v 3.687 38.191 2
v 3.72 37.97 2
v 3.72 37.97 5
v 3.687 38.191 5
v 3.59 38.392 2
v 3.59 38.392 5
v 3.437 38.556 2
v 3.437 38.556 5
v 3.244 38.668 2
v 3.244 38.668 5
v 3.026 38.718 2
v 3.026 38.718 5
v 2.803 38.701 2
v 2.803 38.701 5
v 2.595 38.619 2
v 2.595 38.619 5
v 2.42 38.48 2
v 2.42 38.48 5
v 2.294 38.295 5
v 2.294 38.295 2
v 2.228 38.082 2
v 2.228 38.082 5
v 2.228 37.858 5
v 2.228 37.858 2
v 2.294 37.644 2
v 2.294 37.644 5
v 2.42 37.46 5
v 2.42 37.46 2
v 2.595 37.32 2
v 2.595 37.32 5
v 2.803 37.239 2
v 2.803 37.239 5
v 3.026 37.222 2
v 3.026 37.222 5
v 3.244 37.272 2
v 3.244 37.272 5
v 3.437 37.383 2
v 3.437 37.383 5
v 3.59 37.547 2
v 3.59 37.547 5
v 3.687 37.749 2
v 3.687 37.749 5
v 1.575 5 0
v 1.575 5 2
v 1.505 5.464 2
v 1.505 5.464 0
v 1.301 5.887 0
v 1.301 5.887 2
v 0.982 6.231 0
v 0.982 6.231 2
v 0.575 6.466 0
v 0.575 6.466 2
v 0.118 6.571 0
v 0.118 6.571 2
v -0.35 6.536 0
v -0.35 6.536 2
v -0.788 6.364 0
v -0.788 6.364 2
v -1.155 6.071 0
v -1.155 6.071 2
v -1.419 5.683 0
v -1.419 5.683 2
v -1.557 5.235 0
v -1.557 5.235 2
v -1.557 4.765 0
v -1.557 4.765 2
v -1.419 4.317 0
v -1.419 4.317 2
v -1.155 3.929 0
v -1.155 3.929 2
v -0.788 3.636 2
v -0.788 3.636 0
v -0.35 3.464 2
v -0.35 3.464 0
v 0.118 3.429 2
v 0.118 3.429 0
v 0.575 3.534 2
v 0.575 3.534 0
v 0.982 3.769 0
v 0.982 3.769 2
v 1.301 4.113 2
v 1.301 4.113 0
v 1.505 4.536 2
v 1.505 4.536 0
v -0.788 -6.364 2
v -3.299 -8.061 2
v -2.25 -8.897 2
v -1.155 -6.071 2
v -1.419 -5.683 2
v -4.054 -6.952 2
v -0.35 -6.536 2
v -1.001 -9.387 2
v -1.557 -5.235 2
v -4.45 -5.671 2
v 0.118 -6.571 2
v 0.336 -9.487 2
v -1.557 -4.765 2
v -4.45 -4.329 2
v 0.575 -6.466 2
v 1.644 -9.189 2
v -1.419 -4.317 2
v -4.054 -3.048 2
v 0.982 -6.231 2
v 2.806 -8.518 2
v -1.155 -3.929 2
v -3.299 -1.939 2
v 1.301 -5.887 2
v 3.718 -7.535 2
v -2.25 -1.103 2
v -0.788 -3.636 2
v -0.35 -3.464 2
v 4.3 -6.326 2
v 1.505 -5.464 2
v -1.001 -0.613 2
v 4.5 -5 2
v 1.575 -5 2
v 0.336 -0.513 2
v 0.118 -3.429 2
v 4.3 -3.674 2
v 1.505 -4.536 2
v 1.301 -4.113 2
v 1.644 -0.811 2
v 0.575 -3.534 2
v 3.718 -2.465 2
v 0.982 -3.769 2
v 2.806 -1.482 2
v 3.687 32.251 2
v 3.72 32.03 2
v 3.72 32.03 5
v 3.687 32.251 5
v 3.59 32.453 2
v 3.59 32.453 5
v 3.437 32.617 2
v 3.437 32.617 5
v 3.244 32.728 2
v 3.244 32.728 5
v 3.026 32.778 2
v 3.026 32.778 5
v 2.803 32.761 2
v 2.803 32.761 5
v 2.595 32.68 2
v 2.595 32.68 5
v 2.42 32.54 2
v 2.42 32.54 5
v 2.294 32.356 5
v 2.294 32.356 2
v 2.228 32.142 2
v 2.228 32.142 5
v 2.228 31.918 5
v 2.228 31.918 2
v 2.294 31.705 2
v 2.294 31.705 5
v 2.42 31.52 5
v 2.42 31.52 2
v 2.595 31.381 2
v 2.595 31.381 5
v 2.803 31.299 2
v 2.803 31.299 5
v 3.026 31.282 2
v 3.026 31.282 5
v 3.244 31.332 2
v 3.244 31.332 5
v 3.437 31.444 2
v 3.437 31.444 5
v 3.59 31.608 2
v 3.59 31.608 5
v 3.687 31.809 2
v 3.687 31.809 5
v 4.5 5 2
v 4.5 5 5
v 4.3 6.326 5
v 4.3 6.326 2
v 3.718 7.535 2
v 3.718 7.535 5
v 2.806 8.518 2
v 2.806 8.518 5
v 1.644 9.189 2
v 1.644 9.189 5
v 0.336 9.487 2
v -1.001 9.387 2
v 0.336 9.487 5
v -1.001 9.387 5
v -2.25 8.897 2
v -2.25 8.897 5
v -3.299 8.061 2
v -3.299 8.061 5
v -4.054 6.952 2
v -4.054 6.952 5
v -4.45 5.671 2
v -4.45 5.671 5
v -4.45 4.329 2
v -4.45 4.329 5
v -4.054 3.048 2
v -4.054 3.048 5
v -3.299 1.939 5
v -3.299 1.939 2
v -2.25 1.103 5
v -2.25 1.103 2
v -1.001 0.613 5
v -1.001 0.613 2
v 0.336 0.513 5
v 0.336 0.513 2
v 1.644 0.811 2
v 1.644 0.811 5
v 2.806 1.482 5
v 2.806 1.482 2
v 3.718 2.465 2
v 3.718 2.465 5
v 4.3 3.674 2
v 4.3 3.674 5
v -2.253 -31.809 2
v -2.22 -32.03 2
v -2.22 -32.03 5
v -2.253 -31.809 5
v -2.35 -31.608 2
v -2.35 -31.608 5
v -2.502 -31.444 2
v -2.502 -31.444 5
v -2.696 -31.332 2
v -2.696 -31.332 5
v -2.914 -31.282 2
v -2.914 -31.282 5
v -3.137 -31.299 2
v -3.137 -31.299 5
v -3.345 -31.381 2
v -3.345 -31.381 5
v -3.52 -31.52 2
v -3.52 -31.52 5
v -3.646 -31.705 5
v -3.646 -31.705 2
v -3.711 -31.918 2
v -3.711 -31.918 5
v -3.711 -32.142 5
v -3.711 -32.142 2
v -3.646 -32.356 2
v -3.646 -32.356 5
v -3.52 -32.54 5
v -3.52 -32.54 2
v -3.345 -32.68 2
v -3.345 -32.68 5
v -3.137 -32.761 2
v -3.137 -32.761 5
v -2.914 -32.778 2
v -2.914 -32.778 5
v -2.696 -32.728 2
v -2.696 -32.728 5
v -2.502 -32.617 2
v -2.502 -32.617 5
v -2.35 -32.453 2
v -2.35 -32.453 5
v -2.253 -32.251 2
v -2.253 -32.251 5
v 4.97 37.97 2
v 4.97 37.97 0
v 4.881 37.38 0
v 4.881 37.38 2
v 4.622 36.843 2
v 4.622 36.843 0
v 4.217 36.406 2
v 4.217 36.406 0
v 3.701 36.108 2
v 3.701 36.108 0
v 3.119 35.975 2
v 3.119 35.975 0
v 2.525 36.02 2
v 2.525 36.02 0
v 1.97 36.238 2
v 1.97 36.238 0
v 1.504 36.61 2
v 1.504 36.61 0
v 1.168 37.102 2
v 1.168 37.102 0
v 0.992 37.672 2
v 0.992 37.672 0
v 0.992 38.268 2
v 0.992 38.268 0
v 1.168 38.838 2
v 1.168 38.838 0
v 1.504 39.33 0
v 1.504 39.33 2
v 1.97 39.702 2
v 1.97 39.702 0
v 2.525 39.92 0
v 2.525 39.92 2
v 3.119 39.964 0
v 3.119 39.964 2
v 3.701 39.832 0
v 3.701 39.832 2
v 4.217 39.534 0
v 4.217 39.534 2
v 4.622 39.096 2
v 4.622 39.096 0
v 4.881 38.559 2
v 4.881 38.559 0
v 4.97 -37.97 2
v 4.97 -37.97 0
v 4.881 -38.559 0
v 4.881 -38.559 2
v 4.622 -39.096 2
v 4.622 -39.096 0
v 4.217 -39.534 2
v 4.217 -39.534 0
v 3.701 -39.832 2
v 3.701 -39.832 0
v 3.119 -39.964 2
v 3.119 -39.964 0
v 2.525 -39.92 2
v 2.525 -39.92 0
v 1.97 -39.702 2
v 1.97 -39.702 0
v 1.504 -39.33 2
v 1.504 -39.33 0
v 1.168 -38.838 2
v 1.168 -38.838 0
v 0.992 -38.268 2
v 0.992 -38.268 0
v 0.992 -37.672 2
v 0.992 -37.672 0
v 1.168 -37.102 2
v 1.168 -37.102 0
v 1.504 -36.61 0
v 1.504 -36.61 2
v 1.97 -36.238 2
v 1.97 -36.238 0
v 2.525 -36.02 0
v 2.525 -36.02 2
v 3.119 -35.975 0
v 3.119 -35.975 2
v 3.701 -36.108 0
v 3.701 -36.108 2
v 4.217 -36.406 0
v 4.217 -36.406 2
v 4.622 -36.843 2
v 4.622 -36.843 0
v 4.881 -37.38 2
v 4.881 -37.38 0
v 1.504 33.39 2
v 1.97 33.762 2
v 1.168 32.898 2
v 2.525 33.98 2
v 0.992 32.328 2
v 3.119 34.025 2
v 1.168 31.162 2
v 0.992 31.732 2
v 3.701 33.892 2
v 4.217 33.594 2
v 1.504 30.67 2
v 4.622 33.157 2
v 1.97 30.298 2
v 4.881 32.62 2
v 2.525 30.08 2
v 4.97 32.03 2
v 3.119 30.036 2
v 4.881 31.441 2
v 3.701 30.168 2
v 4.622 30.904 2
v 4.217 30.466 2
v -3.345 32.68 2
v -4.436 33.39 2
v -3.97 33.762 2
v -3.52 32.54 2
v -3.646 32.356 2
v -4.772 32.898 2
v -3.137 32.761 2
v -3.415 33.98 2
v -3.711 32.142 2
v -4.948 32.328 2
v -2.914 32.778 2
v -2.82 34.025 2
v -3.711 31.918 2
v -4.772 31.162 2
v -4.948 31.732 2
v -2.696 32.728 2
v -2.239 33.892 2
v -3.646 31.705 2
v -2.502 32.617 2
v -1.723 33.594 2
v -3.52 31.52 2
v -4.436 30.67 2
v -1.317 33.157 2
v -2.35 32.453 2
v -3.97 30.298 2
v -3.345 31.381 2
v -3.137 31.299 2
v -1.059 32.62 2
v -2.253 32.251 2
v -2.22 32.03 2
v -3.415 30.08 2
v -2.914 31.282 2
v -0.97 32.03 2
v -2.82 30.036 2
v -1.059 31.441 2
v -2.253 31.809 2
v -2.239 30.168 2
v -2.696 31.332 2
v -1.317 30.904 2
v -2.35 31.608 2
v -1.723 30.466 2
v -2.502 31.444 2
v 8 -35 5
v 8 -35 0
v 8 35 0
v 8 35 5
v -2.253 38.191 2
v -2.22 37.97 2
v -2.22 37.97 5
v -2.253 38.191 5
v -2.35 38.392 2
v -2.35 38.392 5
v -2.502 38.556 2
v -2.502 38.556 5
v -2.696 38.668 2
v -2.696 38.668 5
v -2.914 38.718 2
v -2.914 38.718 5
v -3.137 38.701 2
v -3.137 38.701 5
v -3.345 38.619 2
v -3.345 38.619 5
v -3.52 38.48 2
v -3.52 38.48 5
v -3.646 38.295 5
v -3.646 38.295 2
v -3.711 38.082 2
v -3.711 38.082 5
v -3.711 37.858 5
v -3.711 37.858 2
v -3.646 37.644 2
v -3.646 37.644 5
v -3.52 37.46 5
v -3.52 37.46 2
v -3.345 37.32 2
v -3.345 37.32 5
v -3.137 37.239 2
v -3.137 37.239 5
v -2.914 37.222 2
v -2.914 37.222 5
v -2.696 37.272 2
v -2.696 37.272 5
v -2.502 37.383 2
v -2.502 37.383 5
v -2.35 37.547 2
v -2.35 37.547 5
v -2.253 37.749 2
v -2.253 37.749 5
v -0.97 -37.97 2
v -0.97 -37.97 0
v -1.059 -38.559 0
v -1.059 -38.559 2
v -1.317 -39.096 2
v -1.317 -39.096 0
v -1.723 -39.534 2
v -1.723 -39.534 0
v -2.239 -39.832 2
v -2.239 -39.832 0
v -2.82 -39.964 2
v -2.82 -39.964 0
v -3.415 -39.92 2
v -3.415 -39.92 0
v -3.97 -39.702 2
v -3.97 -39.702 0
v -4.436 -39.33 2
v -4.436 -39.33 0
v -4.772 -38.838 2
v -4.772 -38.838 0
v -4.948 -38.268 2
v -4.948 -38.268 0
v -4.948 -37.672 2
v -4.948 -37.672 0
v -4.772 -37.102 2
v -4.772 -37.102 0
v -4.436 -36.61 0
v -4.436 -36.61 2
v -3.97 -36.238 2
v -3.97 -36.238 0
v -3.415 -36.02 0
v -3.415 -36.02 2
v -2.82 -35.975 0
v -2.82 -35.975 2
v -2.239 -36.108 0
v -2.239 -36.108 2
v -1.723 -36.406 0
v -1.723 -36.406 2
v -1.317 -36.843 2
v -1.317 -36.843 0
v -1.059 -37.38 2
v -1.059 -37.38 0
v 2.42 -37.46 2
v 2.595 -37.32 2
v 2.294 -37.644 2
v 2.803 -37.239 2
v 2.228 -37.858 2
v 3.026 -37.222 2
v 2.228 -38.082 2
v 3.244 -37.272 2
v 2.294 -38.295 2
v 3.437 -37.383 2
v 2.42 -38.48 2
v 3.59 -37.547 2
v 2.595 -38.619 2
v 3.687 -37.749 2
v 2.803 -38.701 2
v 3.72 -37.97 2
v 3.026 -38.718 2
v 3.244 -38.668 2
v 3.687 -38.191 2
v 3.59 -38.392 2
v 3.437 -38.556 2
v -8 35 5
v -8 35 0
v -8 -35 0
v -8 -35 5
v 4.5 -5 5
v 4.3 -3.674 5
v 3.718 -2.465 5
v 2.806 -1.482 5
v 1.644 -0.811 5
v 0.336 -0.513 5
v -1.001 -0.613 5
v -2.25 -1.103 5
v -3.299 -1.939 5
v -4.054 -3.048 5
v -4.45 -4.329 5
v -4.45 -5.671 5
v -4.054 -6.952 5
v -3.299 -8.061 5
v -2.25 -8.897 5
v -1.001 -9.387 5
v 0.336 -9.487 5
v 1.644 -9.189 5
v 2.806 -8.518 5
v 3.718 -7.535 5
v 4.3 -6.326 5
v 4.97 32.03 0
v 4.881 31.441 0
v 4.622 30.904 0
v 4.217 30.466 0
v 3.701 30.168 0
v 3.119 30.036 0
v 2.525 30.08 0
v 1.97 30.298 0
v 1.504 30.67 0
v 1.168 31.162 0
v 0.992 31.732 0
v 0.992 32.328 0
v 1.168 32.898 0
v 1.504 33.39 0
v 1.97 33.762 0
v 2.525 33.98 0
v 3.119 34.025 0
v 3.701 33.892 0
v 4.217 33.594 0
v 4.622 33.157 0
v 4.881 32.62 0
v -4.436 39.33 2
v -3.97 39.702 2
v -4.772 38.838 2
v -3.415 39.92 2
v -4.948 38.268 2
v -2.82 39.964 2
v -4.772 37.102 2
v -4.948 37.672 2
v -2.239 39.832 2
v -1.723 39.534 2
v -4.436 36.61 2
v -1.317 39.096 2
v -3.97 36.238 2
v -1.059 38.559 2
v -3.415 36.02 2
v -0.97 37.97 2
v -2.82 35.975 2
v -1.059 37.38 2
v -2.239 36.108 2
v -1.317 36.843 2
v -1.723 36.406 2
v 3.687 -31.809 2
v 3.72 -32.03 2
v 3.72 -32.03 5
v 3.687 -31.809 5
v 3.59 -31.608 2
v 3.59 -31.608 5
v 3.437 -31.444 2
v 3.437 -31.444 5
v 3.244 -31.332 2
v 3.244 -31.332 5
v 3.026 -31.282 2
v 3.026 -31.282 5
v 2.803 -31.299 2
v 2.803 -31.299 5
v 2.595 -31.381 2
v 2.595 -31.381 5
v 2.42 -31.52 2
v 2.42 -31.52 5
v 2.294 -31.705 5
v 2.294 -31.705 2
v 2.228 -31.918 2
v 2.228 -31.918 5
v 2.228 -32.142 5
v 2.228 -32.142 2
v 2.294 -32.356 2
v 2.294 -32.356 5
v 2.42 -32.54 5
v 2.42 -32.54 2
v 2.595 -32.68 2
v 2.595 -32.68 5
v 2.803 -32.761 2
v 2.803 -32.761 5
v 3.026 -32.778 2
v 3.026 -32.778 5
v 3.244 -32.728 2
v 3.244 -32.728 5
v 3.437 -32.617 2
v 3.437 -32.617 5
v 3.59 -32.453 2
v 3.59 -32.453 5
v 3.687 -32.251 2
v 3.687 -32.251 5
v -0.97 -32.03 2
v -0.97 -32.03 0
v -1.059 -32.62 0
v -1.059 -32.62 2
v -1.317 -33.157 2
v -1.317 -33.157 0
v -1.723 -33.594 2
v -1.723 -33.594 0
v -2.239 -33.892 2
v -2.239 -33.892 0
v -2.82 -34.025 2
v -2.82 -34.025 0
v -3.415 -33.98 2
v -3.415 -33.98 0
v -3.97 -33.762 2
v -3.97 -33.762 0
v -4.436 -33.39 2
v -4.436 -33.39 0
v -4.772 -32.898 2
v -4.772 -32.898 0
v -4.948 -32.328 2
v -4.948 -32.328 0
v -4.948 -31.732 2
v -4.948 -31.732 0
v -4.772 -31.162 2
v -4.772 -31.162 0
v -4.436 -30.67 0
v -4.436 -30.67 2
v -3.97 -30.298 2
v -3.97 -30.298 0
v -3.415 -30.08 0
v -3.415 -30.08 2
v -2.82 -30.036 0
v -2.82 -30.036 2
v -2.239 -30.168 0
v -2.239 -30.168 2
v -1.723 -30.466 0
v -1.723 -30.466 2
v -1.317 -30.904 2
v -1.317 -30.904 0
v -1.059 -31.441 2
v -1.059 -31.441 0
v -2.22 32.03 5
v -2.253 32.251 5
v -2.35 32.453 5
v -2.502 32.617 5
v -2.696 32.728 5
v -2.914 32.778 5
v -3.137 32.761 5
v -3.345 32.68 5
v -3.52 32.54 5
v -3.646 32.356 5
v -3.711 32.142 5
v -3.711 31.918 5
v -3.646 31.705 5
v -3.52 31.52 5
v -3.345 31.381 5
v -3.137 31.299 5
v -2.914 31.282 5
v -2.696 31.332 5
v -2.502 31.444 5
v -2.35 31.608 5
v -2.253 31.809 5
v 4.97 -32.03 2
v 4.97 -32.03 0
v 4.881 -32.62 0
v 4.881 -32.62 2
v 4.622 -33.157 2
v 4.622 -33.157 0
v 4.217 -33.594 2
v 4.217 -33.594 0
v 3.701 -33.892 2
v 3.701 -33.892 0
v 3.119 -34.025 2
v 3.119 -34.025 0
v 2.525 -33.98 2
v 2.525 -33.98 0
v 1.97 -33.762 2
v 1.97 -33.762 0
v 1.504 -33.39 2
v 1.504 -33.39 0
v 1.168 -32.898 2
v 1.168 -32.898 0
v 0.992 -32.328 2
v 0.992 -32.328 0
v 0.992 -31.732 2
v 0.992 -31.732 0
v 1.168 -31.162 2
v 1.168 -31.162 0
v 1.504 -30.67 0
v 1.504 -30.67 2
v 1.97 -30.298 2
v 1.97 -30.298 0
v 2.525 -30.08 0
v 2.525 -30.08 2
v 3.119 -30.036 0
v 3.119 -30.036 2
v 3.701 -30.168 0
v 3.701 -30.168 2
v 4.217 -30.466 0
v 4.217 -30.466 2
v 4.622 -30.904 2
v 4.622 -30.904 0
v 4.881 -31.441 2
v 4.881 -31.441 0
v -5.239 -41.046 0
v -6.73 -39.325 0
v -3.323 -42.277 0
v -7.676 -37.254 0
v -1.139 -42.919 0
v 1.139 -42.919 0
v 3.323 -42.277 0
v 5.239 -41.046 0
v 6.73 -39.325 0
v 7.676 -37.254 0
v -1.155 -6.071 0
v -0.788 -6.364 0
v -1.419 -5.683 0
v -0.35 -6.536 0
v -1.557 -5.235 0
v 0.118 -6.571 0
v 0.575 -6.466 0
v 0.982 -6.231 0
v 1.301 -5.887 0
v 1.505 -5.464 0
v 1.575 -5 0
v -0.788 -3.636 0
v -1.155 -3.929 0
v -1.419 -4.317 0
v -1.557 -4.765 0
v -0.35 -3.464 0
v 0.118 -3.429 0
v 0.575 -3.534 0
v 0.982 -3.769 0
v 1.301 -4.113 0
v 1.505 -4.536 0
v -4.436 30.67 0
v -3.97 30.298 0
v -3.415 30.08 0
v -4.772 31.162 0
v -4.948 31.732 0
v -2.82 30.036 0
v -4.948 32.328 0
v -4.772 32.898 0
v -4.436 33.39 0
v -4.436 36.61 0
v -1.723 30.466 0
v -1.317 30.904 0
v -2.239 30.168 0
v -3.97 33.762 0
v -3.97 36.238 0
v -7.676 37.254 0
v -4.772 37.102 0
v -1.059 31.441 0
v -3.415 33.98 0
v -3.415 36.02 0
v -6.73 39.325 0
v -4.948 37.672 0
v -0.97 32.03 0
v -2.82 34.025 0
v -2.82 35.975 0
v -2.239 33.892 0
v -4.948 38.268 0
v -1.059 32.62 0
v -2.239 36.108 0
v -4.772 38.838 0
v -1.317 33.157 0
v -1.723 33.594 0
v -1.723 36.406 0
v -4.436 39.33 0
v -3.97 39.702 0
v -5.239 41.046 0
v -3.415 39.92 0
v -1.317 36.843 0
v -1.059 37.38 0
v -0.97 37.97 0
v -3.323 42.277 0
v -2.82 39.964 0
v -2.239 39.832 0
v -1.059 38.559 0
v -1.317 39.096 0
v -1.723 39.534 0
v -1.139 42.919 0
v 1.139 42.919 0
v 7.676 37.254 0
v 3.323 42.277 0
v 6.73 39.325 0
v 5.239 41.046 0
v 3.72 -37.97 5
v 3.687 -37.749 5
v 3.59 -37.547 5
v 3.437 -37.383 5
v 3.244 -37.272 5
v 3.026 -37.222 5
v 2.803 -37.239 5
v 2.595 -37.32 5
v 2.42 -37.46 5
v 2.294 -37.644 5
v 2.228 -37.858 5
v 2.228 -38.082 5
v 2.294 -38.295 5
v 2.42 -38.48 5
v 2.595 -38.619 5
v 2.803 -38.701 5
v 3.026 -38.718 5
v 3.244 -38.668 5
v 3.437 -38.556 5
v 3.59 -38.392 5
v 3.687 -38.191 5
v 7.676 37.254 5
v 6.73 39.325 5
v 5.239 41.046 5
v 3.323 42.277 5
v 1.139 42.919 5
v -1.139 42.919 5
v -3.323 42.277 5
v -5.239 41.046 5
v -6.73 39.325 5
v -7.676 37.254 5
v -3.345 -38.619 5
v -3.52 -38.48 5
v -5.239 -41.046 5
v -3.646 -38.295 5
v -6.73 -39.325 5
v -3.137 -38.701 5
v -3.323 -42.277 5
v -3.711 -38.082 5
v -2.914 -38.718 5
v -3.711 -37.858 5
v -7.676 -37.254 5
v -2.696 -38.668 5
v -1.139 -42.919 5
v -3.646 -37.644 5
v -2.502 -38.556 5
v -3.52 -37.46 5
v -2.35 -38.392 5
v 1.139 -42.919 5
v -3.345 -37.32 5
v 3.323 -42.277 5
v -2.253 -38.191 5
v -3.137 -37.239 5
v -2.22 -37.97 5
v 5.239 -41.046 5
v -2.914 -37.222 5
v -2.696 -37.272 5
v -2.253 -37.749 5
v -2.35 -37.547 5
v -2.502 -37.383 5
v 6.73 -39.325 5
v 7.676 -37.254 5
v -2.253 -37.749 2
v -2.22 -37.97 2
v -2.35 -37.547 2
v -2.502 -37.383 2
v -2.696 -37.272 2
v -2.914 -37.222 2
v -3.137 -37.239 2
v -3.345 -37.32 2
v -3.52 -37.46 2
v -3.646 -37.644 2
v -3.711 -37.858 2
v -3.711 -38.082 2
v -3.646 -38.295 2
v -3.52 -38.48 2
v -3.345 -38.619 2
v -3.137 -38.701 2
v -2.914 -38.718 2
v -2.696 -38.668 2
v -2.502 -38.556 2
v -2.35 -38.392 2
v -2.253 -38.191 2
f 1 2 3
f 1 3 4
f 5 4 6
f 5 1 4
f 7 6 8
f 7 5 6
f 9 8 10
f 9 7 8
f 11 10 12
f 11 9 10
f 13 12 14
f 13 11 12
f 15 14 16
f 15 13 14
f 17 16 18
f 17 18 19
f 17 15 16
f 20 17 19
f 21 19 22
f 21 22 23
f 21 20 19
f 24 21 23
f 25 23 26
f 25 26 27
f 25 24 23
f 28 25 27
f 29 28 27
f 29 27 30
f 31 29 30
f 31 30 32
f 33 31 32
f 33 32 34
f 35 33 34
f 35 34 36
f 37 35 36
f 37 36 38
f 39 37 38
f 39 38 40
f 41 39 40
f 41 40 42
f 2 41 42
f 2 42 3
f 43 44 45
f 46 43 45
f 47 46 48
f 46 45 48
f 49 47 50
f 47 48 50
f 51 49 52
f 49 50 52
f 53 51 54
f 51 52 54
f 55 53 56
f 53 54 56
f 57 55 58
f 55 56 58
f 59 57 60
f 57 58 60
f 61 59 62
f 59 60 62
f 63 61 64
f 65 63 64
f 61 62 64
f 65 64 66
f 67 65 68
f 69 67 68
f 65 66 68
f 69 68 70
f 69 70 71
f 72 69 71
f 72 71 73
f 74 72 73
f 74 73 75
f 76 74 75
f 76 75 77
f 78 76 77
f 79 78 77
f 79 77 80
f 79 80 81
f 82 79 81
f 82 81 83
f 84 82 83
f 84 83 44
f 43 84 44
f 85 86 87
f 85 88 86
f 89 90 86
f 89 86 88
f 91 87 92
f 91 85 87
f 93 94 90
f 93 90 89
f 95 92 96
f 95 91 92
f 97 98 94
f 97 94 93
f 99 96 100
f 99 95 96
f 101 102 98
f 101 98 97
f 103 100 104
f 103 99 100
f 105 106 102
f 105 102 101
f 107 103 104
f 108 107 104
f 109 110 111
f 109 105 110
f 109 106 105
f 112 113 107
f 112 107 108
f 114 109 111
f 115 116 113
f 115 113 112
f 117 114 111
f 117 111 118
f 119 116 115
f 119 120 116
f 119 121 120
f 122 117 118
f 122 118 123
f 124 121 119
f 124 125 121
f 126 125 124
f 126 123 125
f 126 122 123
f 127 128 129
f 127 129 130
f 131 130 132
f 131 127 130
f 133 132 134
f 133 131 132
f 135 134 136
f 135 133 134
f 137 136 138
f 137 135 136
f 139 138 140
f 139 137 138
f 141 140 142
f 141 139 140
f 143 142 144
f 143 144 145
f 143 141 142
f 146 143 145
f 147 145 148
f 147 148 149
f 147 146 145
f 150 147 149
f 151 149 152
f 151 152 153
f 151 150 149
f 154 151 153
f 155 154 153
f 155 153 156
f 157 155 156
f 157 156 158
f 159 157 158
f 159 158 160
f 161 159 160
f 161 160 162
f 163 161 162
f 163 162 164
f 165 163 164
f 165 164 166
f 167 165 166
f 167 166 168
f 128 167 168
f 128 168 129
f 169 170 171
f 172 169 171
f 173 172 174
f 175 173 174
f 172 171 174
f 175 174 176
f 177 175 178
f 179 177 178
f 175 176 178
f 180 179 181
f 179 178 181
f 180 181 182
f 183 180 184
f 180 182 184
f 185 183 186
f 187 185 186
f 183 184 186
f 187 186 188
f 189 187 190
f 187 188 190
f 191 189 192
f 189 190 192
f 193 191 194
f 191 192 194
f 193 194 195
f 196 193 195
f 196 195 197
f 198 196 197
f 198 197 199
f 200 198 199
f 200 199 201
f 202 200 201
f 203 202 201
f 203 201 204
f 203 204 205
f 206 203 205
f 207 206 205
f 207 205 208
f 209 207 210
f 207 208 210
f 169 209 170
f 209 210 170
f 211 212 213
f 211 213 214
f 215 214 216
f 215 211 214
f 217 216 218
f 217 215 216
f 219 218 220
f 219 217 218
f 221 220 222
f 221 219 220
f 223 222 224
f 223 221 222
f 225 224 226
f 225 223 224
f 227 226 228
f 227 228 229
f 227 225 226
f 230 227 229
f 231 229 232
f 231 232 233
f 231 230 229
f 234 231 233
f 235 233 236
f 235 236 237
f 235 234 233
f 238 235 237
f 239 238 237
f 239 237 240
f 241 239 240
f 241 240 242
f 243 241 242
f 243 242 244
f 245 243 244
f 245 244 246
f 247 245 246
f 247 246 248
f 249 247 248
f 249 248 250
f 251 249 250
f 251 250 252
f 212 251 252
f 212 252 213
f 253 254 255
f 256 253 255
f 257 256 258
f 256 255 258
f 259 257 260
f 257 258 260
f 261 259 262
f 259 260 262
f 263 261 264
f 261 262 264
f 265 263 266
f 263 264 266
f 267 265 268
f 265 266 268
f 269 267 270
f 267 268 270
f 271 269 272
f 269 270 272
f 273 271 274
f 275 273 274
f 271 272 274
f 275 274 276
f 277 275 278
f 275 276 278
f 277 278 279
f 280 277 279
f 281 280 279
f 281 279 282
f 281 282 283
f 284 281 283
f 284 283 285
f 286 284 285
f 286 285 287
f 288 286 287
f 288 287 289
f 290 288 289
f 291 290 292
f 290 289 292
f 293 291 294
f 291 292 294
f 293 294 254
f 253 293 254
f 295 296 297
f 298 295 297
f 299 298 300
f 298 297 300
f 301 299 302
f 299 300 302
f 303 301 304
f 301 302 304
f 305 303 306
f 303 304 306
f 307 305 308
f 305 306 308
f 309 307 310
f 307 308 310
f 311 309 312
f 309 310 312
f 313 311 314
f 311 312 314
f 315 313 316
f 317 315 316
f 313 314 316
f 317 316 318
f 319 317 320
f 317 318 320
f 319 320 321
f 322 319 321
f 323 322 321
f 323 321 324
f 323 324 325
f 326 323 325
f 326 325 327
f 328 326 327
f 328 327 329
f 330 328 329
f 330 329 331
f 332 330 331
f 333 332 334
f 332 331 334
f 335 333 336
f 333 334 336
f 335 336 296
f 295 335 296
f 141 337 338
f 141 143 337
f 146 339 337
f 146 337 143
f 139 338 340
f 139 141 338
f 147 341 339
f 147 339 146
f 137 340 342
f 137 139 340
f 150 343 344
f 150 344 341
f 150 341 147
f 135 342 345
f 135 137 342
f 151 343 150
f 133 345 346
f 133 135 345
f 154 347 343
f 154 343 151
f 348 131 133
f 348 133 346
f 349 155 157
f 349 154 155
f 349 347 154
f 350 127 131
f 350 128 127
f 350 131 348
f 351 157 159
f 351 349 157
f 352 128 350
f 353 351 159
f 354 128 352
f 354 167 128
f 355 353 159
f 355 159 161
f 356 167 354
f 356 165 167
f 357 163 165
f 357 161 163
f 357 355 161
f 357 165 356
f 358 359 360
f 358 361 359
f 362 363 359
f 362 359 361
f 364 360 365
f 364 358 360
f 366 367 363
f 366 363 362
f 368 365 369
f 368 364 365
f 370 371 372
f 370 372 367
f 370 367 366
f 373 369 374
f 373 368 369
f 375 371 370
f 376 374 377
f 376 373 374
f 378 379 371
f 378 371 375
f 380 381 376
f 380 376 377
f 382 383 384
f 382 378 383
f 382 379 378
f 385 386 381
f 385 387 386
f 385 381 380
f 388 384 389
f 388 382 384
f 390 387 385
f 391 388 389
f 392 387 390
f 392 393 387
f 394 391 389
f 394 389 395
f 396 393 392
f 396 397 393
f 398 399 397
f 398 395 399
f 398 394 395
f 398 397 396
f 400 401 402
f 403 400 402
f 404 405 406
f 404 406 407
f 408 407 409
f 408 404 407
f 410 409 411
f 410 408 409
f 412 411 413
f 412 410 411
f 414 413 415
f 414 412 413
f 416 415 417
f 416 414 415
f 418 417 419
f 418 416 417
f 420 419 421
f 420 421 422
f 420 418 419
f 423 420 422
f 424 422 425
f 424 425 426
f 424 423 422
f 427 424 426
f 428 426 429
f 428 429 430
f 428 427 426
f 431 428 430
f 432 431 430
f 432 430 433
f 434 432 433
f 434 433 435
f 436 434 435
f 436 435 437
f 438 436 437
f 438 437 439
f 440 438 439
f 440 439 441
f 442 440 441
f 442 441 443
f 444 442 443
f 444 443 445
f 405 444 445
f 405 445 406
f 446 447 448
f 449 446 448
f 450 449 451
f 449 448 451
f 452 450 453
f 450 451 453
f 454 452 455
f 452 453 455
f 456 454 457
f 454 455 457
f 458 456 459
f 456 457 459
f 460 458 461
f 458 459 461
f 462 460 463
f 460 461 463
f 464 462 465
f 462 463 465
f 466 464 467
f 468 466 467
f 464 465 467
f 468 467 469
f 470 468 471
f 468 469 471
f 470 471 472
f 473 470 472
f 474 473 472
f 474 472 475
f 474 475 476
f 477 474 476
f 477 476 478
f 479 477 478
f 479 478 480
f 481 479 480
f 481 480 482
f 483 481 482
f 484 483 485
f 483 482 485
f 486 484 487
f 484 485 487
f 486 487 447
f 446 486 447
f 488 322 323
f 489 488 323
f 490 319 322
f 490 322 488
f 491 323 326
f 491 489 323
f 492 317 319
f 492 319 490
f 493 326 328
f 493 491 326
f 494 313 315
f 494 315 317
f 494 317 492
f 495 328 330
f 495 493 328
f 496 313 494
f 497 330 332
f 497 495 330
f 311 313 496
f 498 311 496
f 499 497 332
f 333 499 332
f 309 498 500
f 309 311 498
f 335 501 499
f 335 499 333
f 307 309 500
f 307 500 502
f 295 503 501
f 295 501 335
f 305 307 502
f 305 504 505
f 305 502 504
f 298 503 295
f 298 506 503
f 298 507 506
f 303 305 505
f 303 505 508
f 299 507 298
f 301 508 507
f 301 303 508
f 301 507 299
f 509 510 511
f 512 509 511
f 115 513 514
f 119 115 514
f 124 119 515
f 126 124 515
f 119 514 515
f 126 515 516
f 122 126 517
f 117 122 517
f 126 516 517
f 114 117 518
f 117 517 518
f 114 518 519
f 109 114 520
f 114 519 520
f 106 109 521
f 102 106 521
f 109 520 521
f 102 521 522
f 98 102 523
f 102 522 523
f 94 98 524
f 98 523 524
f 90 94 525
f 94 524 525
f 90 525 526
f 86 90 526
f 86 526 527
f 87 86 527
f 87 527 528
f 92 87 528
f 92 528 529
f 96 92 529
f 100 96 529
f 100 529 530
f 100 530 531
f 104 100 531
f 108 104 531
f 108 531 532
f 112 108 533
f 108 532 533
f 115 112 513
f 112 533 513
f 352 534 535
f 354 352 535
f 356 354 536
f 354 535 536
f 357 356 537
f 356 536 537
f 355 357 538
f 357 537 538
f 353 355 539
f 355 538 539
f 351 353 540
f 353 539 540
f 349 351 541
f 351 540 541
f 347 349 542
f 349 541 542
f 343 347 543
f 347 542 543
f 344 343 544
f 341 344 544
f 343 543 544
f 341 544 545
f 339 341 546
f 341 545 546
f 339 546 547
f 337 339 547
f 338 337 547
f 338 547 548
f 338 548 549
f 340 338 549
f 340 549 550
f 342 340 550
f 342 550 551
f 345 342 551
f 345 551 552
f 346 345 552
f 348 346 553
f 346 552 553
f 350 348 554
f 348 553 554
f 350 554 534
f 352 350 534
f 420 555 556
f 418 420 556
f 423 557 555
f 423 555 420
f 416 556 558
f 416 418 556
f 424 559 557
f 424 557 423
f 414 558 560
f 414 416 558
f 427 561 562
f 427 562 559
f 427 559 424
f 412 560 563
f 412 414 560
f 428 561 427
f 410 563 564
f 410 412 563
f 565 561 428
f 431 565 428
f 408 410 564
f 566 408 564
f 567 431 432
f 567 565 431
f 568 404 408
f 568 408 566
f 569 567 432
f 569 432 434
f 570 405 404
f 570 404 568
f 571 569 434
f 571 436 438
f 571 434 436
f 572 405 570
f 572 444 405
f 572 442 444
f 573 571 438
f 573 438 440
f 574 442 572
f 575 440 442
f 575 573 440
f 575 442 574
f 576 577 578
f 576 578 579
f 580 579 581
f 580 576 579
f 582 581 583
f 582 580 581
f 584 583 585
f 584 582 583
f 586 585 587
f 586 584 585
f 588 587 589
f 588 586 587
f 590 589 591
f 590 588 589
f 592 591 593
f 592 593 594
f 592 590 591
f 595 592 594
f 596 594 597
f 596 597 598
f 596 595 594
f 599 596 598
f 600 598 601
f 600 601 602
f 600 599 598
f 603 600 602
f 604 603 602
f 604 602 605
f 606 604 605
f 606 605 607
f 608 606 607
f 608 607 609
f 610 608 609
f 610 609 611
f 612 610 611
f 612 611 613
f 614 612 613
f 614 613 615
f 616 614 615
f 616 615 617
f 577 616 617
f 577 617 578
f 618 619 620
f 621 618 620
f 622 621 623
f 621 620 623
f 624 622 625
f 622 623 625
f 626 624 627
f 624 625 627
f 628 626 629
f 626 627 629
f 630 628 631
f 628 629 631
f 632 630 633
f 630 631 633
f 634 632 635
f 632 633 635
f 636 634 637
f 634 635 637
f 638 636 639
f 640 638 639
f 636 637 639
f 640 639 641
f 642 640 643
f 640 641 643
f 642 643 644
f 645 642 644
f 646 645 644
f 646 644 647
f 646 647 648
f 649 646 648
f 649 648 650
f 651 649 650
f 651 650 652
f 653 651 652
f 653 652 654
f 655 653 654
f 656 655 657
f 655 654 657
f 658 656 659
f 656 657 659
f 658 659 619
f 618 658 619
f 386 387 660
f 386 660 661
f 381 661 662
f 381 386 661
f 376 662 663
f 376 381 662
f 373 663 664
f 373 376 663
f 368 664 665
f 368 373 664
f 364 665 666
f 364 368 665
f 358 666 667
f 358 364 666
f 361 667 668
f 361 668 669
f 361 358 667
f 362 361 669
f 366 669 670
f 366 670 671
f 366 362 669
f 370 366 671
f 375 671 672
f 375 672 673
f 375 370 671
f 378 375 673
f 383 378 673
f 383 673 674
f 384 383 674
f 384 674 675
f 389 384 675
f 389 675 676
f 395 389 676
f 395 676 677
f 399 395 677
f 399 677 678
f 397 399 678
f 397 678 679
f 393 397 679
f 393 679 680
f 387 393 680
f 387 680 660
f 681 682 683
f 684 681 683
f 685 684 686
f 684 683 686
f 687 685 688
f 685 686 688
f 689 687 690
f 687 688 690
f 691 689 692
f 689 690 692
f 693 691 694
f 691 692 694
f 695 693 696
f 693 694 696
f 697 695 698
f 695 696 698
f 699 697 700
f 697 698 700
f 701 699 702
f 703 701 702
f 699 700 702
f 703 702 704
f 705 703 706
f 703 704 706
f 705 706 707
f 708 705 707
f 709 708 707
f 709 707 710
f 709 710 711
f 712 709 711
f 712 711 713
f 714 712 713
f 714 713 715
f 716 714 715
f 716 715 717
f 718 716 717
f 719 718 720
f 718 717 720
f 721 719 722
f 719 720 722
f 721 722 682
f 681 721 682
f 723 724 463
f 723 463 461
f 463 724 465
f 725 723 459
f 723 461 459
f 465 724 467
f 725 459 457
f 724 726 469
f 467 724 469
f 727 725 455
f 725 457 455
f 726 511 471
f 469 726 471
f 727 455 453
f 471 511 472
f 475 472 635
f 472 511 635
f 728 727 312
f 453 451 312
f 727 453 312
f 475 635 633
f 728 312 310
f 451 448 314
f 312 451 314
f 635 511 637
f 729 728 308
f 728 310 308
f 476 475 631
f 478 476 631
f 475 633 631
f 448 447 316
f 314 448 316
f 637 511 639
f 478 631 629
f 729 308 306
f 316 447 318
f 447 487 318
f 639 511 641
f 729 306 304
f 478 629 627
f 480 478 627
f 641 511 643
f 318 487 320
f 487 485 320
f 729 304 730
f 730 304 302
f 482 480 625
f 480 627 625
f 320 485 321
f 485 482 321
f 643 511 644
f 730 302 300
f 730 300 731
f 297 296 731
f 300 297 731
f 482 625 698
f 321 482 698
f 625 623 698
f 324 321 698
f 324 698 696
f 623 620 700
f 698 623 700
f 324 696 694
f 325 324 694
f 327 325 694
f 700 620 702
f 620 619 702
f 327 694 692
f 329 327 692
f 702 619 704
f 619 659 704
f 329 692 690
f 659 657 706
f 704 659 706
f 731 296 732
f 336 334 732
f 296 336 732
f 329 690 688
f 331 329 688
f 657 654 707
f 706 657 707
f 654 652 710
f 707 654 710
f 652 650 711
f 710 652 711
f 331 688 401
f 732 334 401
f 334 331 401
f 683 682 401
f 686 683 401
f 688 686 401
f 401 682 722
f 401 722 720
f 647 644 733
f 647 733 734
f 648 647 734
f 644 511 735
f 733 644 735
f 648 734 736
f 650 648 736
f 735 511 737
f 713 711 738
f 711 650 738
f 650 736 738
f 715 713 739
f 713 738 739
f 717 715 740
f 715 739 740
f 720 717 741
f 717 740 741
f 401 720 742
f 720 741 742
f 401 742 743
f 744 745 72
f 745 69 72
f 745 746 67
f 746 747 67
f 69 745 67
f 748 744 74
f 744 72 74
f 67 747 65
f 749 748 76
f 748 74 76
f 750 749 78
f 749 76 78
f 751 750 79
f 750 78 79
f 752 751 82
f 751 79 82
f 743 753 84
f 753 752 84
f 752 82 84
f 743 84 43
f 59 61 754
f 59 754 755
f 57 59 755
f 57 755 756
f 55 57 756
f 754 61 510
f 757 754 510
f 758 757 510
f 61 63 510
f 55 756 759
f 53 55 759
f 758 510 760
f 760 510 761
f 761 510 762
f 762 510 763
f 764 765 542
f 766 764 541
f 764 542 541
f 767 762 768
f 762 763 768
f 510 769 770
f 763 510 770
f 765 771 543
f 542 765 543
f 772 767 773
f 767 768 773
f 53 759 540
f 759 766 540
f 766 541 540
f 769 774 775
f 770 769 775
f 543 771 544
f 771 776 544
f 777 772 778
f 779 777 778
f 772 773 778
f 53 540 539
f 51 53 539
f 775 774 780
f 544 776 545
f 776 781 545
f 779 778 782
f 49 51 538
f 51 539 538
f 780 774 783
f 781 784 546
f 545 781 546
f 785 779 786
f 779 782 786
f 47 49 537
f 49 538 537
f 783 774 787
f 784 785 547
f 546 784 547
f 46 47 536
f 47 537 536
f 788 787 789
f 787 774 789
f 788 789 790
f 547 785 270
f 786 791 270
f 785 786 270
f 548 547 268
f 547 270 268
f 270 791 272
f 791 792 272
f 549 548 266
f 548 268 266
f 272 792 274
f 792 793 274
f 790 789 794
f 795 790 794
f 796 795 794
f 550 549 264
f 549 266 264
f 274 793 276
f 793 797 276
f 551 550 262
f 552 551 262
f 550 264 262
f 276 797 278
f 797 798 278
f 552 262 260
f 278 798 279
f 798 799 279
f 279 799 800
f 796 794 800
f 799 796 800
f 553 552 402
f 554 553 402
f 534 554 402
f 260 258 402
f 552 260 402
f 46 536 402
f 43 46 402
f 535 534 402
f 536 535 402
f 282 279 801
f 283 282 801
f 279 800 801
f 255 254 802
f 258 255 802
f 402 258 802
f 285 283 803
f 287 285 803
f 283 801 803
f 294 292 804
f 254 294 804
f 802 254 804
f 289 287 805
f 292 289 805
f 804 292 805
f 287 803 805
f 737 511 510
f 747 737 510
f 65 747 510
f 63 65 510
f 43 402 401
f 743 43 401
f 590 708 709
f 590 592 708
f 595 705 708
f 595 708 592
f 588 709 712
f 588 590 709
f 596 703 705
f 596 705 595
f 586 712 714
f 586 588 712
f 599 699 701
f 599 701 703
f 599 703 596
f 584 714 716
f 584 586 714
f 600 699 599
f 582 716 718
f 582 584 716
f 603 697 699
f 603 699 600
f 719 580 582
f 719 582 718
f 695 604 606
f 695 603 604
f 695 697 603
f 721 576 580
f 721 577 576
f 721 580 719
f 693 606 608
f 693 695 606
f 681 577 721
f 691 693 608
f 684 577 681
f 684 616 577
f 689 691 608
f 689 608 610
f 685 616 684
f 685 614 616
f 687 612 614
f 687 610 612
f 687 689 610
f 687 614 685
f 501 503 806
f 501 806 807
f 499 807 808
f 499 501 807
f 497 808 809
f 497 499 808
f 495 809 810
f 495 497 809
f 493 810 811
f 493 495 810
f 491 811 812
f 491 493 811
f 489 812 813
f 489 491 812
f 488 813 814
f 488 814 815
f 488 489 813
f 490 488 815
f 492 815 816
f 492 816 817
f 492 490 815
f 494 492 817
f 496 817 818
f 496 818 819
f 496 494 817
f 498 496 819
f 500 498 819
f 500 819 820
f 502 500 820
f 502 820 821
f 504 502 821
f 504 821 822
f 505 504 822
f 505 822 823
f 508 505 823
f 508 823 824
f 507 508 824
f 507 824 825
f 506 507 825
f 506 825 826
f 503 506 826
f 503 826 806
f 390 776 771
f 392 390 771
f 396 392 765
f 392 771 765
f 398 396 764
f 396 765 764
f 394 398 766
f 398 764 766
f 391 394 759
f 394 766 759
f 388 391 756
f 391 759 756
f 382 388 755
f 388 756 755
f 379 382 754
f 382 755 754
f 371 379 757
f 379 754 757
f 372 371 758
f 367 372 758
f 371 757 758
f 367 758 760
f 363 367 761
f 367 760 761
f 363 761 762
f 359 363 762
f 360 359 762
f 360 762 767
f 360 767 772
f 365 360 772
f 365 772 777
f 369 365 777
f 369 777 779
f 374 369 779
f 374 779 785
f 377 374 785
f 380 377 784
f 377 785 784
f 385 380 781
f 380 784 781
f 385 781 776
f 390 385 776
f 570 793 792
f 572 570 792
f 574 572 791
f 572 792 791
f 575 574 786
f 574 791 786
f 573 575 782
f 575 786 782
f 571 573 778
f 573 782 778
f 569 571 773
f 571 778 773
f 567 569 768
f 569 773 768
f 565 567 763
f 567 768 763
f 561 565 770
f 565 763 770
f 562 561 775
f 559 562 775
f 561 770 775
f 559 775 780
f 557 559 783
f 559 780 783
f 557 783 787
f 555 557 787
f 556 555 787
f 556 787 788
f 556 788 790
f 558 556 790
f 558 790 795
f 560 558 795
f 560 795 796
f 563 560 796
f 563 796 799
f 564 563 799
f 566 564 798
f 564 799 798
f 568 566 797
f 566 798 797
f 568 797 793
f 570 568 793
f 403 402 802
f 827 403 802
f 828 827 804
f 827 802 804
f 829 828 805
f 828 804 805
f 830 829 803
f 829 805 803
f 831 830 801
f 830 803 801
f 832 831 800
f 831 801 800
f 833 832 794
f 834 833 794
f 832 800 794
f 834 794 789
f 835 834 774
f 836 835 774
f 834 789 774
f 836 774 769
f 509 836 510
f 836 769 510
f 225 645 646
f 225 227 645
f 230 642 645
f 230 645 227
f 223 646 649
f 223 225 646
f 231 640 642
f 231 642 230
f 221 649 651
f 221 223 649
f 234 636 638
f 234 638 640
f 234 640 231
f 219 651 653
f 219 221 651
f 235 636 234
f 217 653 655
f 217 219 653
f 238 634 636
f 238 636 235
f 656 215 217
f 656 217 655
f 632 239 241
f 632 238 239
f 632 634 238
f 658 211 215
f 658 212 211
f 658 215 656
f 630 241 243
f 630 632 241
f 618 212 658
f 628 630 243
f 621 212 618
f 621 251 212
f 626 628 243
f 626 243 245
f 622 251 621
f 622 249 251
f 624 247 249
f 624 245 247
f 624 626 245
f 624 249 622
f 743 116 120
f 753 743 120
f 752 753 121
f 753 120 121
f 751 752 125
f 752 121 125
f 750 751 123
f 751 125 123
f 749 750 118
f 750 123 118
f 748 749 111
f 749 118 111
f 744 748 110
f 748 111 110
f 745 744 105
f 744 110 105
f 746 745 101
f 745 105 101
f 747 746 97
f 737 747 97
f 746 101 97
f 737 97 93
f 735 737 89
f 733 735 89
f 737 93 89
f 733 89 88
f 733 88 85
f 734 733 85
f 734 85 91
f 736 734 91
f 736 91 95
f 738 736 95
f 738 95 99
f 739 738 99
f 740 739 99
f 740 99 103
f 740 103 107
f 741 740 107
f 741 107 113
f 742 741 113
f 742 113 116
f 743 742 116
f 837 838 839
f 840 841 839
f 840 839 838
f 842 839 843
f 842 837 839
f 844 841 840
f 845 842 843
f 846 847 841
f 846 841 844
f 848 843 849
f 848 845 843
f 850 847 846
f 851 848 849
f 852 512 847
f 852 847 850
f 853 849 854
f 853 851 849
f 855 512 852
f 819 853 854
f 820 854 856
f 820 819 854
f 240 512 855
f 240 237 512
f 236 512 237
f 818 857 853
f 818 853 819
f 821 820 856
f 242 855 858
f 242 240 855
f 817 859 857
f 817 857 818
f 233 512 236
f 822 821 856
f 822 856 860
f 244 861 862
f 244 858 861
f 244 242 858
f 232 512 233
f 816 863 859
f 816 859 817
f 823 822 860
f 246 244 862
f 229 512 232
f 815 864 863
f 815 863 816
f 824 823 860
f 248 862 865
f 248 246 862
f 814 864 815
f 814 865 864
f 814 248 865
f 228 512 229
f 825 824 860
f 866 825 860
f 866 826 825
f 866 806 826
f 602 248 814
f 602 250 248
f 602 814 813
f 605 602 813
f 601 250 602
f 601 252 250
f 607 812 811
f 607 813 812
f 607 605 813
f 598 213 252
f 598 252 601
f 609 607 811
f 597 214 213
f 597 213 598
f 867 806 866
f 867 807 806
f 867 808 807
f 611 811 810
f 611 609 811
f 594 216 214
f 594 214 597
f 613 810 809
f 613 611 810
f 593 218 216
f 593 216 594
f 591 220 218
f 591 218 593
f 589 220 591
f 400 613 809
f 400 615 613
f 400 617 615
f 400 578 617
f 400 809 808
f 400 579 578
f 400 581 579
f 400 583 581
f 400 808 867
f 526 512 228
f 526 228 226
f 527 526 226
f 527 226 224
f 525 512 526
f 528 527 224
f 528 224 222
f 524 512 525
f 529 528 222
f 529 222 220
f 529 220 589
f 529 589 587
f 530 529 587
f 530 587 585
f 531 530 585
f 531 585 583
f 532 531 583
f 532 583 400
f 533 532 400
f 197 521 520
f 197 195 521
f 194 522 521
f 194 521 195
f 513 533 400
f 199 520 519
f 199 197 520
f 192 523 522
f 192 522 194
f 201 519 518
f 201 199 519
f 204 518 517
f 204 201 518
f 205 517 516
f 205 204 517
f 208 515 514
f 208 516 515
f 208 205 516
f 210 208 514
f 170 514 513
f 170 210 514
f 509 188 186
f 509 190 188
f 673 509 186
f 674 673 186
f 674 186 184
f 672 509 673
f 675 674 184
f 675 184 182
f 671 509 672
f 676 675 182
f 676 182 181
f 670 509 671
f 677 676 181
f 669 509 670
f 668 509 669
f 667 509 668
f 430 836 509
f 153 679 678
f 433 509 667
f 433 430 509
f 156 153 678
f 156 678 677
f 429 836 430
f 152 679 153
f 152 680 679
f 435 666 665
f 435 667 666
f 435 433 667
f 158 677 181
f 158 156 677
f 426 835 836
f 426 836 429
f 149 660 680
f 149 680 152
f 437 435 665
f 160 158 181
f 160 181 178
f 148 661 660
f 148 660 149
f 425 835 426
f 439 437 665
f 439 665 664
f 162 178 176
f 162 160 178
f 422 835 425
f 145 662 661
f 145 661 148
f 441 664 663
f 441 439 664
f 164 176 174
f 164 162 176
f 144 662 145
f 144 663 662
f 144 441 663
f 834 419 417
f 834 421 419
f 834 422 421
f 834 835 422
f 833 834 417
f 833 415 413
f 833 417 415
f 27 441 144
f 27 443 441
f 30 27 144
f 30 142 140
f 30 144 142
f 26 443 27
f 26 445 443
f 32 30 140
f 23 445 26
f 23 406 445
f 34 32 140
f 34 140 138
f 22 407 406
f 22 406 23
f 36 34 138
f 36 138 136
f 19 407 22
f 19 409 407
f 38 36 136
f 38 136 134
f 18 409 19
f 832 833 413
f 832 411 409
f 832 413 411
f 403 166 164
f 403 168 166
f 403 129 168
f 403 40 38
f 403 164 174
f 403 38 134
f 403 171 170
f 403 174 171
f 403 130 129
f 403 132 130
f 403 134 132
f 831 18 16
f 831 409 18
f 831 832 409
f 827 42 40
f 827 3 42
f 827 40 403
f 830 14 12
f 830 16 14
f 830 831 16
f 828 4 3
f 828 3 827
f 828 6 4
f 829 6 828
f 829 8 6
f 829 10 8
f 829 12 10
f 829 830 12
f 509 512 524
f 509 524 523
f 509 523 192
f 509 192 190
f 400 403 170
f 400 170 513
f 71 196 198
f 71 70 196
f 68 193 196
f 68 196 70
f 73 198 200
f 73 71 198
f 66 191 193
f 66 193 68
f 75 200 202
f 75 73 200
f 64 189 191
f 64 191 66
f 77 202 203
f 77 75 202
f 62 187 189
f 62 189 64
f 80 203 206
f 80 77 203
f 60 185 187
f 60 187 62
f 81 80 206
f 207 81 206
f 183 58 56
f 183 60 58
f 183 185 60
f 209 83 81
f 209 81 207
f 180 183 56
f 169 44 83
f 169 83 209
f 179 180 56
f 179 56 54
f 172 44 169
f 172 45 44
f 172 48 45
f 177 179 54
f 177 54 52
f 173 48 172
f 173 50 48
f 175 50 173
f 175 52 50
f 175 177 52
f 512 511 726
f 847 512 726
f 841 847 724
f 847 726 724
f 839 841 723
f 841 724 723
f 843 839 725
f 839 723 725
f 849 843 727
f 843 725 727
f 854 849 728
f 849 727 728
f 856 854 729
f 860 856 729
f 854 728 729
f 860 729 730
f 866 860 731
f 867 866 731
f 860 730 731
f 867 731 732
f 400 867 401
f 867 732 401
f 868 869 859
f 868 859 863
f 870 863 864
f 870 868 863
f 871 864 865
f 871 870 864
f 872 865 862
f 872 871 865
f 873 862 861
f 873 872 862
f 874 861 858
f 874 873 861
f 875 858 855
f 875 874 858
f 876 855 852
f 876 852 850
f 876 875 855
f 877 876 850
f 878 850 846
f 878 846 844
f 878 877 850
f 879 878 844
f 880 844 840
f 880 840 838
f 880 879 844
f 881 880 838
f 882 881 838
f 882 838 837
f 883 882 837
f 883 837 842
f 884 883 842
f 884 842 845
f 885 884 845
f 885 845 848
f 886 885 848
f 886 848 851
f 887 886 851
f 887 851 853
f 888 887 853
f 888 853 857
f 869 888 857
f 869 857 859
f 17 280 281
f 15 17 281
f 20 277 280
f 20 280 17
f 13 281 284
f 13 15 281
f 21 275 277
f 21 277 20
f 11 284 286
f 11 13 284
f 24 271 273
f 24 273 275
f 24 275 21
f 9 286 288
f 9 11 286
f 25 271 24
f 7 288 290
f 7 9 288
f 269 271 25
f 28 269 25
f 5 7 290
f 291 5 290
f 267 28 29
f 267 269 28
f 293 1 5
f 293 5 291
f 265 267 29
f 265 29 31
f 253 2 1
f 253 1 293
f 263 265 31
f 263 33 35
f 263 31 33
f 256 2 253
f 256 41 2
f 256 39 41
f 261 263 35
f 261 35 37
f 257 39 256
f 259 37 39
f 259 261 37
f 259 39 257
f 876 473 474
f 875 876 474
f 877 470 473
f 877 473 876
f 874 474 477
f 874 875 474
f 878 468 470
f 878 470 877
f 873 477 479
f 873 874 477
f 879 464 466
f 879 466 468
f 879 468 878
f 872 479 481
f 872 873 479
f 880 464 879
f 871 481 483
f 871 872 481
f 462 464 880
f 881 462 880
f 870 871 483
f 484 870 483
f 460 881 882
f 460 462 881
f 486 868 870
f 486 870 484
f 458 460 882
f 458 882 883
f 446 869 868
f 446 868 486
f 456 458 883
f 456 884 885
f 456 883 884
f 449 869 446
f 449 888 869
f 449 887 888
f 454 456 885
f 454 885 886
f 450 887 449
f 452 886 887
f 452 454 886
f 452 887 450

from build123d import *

# Parameters (mm, degrees)
F0_R     = 0.75
F1_DEPTH = 5
F2_R     = 1.575
F3_DEPTH = 5.001
F4_R     = 4.5
F5_DEPTH = 3
F6_R     = 2
F7_DEPTH = 2


with BuildPart() as f1:
    # F0 (on Top) → F1 (new body)
    with BuildSketch(Plane.XY):
        with BuildLine():
            Line((-8, 35), (-8, 0))
            Line((-8, 0), (-8, -35))
            ThreePointArc((-8, -35), (0, -43), (8, -35))
            Line((8, -35), (8, 0))
            Line((8, 0), (8, 35))
            ThreePointArc((8, 35), (0, 43), (-8, 35))
        make_face()
        with Locations((-2.969848, -37.969848)):
            Circle(F0_R, mode=Mode.SUBTRACT)
        with Locations((-2.969848, -32.030152)):
            Circle(F0_R, mode=Mode.SUBTRACT)
        with Locations((2.969848, -37.969848)):
            Circle(F0_R, mode=Mode.SUBTRACT)
        with Locations((2.969848, -32.030152)):
            Circle(F0_R, mode=Mode.SUBTRACT)
        with Locations((-2.969848, 32.030152)):
            Circle(F0_R, mode=Mode.SUBTRACT)
        with Locations((-2.969848, 37.969848)):
            Circle(F0_R, mode=Mode.SUBTRACT)
        with Locations((2.969848, 32.030152)):
            Circle(F0_R, mode=Mode.SUBTRACT)
        with Locations((2.969848, 37.969848)):
            Circle(F0_R, mode=Mode.SUBTRACT)
    extrude(amount=F1_DEPTH)

    # F2 (on face) → F3 (cut, through all)
    with BuildSketch(Plane.XY.offset(5)):
        with Locations((0, 5)):
            Circle(F2_R)
        with Locations((0, -5)):
            Circle(F2_R)
    extrude(amount=-F3_DEPTH, mode=Mode.SUBTRACT)

    # F4 (on face) → F5 (cut)
    with BuildSketch(Plane.XY.offset(5)):
        with Locations((0, 5)):
            Circle(F4_R)
        with Locations((0, -5)):
            Circle(F4_R)
    extrude(amount=-F5_DEPTH, mode=Mode.SUBTRACT)

    # F6 (on face) → F7 (cut)
    with BuildSketch(Plane(origin=(0, 0, 0), x_dir=(1, 0, 0), z_dir=(0, 0, -1))):
        with Locations((-2.969848, 37.969848)):
            Circle(F6_R)
        with Locations((2.969848, 37.969848)):
            Circle(F6_R)
        with Locations((2.969848, 32.030152)):
            Circle(F6_R)
        with Locations((-2.969848, 32.030152)):
            Circle(F6_R)
        with Locations((-2.969848, -32.030152)):
            Circle(F6_R)
        with Locations((-2.969848, -37.969848)):
            Circle(F6_R)
        with Locations((2.969848, -37.969848)):
            Circle(F6_R)
        with Locations((2.969848, -32.030152)):
            Circle(F6_R)
    extrude(amount=-F7_DEPTH, mode=Mode.SUBTRACT)


solid = f1.part
